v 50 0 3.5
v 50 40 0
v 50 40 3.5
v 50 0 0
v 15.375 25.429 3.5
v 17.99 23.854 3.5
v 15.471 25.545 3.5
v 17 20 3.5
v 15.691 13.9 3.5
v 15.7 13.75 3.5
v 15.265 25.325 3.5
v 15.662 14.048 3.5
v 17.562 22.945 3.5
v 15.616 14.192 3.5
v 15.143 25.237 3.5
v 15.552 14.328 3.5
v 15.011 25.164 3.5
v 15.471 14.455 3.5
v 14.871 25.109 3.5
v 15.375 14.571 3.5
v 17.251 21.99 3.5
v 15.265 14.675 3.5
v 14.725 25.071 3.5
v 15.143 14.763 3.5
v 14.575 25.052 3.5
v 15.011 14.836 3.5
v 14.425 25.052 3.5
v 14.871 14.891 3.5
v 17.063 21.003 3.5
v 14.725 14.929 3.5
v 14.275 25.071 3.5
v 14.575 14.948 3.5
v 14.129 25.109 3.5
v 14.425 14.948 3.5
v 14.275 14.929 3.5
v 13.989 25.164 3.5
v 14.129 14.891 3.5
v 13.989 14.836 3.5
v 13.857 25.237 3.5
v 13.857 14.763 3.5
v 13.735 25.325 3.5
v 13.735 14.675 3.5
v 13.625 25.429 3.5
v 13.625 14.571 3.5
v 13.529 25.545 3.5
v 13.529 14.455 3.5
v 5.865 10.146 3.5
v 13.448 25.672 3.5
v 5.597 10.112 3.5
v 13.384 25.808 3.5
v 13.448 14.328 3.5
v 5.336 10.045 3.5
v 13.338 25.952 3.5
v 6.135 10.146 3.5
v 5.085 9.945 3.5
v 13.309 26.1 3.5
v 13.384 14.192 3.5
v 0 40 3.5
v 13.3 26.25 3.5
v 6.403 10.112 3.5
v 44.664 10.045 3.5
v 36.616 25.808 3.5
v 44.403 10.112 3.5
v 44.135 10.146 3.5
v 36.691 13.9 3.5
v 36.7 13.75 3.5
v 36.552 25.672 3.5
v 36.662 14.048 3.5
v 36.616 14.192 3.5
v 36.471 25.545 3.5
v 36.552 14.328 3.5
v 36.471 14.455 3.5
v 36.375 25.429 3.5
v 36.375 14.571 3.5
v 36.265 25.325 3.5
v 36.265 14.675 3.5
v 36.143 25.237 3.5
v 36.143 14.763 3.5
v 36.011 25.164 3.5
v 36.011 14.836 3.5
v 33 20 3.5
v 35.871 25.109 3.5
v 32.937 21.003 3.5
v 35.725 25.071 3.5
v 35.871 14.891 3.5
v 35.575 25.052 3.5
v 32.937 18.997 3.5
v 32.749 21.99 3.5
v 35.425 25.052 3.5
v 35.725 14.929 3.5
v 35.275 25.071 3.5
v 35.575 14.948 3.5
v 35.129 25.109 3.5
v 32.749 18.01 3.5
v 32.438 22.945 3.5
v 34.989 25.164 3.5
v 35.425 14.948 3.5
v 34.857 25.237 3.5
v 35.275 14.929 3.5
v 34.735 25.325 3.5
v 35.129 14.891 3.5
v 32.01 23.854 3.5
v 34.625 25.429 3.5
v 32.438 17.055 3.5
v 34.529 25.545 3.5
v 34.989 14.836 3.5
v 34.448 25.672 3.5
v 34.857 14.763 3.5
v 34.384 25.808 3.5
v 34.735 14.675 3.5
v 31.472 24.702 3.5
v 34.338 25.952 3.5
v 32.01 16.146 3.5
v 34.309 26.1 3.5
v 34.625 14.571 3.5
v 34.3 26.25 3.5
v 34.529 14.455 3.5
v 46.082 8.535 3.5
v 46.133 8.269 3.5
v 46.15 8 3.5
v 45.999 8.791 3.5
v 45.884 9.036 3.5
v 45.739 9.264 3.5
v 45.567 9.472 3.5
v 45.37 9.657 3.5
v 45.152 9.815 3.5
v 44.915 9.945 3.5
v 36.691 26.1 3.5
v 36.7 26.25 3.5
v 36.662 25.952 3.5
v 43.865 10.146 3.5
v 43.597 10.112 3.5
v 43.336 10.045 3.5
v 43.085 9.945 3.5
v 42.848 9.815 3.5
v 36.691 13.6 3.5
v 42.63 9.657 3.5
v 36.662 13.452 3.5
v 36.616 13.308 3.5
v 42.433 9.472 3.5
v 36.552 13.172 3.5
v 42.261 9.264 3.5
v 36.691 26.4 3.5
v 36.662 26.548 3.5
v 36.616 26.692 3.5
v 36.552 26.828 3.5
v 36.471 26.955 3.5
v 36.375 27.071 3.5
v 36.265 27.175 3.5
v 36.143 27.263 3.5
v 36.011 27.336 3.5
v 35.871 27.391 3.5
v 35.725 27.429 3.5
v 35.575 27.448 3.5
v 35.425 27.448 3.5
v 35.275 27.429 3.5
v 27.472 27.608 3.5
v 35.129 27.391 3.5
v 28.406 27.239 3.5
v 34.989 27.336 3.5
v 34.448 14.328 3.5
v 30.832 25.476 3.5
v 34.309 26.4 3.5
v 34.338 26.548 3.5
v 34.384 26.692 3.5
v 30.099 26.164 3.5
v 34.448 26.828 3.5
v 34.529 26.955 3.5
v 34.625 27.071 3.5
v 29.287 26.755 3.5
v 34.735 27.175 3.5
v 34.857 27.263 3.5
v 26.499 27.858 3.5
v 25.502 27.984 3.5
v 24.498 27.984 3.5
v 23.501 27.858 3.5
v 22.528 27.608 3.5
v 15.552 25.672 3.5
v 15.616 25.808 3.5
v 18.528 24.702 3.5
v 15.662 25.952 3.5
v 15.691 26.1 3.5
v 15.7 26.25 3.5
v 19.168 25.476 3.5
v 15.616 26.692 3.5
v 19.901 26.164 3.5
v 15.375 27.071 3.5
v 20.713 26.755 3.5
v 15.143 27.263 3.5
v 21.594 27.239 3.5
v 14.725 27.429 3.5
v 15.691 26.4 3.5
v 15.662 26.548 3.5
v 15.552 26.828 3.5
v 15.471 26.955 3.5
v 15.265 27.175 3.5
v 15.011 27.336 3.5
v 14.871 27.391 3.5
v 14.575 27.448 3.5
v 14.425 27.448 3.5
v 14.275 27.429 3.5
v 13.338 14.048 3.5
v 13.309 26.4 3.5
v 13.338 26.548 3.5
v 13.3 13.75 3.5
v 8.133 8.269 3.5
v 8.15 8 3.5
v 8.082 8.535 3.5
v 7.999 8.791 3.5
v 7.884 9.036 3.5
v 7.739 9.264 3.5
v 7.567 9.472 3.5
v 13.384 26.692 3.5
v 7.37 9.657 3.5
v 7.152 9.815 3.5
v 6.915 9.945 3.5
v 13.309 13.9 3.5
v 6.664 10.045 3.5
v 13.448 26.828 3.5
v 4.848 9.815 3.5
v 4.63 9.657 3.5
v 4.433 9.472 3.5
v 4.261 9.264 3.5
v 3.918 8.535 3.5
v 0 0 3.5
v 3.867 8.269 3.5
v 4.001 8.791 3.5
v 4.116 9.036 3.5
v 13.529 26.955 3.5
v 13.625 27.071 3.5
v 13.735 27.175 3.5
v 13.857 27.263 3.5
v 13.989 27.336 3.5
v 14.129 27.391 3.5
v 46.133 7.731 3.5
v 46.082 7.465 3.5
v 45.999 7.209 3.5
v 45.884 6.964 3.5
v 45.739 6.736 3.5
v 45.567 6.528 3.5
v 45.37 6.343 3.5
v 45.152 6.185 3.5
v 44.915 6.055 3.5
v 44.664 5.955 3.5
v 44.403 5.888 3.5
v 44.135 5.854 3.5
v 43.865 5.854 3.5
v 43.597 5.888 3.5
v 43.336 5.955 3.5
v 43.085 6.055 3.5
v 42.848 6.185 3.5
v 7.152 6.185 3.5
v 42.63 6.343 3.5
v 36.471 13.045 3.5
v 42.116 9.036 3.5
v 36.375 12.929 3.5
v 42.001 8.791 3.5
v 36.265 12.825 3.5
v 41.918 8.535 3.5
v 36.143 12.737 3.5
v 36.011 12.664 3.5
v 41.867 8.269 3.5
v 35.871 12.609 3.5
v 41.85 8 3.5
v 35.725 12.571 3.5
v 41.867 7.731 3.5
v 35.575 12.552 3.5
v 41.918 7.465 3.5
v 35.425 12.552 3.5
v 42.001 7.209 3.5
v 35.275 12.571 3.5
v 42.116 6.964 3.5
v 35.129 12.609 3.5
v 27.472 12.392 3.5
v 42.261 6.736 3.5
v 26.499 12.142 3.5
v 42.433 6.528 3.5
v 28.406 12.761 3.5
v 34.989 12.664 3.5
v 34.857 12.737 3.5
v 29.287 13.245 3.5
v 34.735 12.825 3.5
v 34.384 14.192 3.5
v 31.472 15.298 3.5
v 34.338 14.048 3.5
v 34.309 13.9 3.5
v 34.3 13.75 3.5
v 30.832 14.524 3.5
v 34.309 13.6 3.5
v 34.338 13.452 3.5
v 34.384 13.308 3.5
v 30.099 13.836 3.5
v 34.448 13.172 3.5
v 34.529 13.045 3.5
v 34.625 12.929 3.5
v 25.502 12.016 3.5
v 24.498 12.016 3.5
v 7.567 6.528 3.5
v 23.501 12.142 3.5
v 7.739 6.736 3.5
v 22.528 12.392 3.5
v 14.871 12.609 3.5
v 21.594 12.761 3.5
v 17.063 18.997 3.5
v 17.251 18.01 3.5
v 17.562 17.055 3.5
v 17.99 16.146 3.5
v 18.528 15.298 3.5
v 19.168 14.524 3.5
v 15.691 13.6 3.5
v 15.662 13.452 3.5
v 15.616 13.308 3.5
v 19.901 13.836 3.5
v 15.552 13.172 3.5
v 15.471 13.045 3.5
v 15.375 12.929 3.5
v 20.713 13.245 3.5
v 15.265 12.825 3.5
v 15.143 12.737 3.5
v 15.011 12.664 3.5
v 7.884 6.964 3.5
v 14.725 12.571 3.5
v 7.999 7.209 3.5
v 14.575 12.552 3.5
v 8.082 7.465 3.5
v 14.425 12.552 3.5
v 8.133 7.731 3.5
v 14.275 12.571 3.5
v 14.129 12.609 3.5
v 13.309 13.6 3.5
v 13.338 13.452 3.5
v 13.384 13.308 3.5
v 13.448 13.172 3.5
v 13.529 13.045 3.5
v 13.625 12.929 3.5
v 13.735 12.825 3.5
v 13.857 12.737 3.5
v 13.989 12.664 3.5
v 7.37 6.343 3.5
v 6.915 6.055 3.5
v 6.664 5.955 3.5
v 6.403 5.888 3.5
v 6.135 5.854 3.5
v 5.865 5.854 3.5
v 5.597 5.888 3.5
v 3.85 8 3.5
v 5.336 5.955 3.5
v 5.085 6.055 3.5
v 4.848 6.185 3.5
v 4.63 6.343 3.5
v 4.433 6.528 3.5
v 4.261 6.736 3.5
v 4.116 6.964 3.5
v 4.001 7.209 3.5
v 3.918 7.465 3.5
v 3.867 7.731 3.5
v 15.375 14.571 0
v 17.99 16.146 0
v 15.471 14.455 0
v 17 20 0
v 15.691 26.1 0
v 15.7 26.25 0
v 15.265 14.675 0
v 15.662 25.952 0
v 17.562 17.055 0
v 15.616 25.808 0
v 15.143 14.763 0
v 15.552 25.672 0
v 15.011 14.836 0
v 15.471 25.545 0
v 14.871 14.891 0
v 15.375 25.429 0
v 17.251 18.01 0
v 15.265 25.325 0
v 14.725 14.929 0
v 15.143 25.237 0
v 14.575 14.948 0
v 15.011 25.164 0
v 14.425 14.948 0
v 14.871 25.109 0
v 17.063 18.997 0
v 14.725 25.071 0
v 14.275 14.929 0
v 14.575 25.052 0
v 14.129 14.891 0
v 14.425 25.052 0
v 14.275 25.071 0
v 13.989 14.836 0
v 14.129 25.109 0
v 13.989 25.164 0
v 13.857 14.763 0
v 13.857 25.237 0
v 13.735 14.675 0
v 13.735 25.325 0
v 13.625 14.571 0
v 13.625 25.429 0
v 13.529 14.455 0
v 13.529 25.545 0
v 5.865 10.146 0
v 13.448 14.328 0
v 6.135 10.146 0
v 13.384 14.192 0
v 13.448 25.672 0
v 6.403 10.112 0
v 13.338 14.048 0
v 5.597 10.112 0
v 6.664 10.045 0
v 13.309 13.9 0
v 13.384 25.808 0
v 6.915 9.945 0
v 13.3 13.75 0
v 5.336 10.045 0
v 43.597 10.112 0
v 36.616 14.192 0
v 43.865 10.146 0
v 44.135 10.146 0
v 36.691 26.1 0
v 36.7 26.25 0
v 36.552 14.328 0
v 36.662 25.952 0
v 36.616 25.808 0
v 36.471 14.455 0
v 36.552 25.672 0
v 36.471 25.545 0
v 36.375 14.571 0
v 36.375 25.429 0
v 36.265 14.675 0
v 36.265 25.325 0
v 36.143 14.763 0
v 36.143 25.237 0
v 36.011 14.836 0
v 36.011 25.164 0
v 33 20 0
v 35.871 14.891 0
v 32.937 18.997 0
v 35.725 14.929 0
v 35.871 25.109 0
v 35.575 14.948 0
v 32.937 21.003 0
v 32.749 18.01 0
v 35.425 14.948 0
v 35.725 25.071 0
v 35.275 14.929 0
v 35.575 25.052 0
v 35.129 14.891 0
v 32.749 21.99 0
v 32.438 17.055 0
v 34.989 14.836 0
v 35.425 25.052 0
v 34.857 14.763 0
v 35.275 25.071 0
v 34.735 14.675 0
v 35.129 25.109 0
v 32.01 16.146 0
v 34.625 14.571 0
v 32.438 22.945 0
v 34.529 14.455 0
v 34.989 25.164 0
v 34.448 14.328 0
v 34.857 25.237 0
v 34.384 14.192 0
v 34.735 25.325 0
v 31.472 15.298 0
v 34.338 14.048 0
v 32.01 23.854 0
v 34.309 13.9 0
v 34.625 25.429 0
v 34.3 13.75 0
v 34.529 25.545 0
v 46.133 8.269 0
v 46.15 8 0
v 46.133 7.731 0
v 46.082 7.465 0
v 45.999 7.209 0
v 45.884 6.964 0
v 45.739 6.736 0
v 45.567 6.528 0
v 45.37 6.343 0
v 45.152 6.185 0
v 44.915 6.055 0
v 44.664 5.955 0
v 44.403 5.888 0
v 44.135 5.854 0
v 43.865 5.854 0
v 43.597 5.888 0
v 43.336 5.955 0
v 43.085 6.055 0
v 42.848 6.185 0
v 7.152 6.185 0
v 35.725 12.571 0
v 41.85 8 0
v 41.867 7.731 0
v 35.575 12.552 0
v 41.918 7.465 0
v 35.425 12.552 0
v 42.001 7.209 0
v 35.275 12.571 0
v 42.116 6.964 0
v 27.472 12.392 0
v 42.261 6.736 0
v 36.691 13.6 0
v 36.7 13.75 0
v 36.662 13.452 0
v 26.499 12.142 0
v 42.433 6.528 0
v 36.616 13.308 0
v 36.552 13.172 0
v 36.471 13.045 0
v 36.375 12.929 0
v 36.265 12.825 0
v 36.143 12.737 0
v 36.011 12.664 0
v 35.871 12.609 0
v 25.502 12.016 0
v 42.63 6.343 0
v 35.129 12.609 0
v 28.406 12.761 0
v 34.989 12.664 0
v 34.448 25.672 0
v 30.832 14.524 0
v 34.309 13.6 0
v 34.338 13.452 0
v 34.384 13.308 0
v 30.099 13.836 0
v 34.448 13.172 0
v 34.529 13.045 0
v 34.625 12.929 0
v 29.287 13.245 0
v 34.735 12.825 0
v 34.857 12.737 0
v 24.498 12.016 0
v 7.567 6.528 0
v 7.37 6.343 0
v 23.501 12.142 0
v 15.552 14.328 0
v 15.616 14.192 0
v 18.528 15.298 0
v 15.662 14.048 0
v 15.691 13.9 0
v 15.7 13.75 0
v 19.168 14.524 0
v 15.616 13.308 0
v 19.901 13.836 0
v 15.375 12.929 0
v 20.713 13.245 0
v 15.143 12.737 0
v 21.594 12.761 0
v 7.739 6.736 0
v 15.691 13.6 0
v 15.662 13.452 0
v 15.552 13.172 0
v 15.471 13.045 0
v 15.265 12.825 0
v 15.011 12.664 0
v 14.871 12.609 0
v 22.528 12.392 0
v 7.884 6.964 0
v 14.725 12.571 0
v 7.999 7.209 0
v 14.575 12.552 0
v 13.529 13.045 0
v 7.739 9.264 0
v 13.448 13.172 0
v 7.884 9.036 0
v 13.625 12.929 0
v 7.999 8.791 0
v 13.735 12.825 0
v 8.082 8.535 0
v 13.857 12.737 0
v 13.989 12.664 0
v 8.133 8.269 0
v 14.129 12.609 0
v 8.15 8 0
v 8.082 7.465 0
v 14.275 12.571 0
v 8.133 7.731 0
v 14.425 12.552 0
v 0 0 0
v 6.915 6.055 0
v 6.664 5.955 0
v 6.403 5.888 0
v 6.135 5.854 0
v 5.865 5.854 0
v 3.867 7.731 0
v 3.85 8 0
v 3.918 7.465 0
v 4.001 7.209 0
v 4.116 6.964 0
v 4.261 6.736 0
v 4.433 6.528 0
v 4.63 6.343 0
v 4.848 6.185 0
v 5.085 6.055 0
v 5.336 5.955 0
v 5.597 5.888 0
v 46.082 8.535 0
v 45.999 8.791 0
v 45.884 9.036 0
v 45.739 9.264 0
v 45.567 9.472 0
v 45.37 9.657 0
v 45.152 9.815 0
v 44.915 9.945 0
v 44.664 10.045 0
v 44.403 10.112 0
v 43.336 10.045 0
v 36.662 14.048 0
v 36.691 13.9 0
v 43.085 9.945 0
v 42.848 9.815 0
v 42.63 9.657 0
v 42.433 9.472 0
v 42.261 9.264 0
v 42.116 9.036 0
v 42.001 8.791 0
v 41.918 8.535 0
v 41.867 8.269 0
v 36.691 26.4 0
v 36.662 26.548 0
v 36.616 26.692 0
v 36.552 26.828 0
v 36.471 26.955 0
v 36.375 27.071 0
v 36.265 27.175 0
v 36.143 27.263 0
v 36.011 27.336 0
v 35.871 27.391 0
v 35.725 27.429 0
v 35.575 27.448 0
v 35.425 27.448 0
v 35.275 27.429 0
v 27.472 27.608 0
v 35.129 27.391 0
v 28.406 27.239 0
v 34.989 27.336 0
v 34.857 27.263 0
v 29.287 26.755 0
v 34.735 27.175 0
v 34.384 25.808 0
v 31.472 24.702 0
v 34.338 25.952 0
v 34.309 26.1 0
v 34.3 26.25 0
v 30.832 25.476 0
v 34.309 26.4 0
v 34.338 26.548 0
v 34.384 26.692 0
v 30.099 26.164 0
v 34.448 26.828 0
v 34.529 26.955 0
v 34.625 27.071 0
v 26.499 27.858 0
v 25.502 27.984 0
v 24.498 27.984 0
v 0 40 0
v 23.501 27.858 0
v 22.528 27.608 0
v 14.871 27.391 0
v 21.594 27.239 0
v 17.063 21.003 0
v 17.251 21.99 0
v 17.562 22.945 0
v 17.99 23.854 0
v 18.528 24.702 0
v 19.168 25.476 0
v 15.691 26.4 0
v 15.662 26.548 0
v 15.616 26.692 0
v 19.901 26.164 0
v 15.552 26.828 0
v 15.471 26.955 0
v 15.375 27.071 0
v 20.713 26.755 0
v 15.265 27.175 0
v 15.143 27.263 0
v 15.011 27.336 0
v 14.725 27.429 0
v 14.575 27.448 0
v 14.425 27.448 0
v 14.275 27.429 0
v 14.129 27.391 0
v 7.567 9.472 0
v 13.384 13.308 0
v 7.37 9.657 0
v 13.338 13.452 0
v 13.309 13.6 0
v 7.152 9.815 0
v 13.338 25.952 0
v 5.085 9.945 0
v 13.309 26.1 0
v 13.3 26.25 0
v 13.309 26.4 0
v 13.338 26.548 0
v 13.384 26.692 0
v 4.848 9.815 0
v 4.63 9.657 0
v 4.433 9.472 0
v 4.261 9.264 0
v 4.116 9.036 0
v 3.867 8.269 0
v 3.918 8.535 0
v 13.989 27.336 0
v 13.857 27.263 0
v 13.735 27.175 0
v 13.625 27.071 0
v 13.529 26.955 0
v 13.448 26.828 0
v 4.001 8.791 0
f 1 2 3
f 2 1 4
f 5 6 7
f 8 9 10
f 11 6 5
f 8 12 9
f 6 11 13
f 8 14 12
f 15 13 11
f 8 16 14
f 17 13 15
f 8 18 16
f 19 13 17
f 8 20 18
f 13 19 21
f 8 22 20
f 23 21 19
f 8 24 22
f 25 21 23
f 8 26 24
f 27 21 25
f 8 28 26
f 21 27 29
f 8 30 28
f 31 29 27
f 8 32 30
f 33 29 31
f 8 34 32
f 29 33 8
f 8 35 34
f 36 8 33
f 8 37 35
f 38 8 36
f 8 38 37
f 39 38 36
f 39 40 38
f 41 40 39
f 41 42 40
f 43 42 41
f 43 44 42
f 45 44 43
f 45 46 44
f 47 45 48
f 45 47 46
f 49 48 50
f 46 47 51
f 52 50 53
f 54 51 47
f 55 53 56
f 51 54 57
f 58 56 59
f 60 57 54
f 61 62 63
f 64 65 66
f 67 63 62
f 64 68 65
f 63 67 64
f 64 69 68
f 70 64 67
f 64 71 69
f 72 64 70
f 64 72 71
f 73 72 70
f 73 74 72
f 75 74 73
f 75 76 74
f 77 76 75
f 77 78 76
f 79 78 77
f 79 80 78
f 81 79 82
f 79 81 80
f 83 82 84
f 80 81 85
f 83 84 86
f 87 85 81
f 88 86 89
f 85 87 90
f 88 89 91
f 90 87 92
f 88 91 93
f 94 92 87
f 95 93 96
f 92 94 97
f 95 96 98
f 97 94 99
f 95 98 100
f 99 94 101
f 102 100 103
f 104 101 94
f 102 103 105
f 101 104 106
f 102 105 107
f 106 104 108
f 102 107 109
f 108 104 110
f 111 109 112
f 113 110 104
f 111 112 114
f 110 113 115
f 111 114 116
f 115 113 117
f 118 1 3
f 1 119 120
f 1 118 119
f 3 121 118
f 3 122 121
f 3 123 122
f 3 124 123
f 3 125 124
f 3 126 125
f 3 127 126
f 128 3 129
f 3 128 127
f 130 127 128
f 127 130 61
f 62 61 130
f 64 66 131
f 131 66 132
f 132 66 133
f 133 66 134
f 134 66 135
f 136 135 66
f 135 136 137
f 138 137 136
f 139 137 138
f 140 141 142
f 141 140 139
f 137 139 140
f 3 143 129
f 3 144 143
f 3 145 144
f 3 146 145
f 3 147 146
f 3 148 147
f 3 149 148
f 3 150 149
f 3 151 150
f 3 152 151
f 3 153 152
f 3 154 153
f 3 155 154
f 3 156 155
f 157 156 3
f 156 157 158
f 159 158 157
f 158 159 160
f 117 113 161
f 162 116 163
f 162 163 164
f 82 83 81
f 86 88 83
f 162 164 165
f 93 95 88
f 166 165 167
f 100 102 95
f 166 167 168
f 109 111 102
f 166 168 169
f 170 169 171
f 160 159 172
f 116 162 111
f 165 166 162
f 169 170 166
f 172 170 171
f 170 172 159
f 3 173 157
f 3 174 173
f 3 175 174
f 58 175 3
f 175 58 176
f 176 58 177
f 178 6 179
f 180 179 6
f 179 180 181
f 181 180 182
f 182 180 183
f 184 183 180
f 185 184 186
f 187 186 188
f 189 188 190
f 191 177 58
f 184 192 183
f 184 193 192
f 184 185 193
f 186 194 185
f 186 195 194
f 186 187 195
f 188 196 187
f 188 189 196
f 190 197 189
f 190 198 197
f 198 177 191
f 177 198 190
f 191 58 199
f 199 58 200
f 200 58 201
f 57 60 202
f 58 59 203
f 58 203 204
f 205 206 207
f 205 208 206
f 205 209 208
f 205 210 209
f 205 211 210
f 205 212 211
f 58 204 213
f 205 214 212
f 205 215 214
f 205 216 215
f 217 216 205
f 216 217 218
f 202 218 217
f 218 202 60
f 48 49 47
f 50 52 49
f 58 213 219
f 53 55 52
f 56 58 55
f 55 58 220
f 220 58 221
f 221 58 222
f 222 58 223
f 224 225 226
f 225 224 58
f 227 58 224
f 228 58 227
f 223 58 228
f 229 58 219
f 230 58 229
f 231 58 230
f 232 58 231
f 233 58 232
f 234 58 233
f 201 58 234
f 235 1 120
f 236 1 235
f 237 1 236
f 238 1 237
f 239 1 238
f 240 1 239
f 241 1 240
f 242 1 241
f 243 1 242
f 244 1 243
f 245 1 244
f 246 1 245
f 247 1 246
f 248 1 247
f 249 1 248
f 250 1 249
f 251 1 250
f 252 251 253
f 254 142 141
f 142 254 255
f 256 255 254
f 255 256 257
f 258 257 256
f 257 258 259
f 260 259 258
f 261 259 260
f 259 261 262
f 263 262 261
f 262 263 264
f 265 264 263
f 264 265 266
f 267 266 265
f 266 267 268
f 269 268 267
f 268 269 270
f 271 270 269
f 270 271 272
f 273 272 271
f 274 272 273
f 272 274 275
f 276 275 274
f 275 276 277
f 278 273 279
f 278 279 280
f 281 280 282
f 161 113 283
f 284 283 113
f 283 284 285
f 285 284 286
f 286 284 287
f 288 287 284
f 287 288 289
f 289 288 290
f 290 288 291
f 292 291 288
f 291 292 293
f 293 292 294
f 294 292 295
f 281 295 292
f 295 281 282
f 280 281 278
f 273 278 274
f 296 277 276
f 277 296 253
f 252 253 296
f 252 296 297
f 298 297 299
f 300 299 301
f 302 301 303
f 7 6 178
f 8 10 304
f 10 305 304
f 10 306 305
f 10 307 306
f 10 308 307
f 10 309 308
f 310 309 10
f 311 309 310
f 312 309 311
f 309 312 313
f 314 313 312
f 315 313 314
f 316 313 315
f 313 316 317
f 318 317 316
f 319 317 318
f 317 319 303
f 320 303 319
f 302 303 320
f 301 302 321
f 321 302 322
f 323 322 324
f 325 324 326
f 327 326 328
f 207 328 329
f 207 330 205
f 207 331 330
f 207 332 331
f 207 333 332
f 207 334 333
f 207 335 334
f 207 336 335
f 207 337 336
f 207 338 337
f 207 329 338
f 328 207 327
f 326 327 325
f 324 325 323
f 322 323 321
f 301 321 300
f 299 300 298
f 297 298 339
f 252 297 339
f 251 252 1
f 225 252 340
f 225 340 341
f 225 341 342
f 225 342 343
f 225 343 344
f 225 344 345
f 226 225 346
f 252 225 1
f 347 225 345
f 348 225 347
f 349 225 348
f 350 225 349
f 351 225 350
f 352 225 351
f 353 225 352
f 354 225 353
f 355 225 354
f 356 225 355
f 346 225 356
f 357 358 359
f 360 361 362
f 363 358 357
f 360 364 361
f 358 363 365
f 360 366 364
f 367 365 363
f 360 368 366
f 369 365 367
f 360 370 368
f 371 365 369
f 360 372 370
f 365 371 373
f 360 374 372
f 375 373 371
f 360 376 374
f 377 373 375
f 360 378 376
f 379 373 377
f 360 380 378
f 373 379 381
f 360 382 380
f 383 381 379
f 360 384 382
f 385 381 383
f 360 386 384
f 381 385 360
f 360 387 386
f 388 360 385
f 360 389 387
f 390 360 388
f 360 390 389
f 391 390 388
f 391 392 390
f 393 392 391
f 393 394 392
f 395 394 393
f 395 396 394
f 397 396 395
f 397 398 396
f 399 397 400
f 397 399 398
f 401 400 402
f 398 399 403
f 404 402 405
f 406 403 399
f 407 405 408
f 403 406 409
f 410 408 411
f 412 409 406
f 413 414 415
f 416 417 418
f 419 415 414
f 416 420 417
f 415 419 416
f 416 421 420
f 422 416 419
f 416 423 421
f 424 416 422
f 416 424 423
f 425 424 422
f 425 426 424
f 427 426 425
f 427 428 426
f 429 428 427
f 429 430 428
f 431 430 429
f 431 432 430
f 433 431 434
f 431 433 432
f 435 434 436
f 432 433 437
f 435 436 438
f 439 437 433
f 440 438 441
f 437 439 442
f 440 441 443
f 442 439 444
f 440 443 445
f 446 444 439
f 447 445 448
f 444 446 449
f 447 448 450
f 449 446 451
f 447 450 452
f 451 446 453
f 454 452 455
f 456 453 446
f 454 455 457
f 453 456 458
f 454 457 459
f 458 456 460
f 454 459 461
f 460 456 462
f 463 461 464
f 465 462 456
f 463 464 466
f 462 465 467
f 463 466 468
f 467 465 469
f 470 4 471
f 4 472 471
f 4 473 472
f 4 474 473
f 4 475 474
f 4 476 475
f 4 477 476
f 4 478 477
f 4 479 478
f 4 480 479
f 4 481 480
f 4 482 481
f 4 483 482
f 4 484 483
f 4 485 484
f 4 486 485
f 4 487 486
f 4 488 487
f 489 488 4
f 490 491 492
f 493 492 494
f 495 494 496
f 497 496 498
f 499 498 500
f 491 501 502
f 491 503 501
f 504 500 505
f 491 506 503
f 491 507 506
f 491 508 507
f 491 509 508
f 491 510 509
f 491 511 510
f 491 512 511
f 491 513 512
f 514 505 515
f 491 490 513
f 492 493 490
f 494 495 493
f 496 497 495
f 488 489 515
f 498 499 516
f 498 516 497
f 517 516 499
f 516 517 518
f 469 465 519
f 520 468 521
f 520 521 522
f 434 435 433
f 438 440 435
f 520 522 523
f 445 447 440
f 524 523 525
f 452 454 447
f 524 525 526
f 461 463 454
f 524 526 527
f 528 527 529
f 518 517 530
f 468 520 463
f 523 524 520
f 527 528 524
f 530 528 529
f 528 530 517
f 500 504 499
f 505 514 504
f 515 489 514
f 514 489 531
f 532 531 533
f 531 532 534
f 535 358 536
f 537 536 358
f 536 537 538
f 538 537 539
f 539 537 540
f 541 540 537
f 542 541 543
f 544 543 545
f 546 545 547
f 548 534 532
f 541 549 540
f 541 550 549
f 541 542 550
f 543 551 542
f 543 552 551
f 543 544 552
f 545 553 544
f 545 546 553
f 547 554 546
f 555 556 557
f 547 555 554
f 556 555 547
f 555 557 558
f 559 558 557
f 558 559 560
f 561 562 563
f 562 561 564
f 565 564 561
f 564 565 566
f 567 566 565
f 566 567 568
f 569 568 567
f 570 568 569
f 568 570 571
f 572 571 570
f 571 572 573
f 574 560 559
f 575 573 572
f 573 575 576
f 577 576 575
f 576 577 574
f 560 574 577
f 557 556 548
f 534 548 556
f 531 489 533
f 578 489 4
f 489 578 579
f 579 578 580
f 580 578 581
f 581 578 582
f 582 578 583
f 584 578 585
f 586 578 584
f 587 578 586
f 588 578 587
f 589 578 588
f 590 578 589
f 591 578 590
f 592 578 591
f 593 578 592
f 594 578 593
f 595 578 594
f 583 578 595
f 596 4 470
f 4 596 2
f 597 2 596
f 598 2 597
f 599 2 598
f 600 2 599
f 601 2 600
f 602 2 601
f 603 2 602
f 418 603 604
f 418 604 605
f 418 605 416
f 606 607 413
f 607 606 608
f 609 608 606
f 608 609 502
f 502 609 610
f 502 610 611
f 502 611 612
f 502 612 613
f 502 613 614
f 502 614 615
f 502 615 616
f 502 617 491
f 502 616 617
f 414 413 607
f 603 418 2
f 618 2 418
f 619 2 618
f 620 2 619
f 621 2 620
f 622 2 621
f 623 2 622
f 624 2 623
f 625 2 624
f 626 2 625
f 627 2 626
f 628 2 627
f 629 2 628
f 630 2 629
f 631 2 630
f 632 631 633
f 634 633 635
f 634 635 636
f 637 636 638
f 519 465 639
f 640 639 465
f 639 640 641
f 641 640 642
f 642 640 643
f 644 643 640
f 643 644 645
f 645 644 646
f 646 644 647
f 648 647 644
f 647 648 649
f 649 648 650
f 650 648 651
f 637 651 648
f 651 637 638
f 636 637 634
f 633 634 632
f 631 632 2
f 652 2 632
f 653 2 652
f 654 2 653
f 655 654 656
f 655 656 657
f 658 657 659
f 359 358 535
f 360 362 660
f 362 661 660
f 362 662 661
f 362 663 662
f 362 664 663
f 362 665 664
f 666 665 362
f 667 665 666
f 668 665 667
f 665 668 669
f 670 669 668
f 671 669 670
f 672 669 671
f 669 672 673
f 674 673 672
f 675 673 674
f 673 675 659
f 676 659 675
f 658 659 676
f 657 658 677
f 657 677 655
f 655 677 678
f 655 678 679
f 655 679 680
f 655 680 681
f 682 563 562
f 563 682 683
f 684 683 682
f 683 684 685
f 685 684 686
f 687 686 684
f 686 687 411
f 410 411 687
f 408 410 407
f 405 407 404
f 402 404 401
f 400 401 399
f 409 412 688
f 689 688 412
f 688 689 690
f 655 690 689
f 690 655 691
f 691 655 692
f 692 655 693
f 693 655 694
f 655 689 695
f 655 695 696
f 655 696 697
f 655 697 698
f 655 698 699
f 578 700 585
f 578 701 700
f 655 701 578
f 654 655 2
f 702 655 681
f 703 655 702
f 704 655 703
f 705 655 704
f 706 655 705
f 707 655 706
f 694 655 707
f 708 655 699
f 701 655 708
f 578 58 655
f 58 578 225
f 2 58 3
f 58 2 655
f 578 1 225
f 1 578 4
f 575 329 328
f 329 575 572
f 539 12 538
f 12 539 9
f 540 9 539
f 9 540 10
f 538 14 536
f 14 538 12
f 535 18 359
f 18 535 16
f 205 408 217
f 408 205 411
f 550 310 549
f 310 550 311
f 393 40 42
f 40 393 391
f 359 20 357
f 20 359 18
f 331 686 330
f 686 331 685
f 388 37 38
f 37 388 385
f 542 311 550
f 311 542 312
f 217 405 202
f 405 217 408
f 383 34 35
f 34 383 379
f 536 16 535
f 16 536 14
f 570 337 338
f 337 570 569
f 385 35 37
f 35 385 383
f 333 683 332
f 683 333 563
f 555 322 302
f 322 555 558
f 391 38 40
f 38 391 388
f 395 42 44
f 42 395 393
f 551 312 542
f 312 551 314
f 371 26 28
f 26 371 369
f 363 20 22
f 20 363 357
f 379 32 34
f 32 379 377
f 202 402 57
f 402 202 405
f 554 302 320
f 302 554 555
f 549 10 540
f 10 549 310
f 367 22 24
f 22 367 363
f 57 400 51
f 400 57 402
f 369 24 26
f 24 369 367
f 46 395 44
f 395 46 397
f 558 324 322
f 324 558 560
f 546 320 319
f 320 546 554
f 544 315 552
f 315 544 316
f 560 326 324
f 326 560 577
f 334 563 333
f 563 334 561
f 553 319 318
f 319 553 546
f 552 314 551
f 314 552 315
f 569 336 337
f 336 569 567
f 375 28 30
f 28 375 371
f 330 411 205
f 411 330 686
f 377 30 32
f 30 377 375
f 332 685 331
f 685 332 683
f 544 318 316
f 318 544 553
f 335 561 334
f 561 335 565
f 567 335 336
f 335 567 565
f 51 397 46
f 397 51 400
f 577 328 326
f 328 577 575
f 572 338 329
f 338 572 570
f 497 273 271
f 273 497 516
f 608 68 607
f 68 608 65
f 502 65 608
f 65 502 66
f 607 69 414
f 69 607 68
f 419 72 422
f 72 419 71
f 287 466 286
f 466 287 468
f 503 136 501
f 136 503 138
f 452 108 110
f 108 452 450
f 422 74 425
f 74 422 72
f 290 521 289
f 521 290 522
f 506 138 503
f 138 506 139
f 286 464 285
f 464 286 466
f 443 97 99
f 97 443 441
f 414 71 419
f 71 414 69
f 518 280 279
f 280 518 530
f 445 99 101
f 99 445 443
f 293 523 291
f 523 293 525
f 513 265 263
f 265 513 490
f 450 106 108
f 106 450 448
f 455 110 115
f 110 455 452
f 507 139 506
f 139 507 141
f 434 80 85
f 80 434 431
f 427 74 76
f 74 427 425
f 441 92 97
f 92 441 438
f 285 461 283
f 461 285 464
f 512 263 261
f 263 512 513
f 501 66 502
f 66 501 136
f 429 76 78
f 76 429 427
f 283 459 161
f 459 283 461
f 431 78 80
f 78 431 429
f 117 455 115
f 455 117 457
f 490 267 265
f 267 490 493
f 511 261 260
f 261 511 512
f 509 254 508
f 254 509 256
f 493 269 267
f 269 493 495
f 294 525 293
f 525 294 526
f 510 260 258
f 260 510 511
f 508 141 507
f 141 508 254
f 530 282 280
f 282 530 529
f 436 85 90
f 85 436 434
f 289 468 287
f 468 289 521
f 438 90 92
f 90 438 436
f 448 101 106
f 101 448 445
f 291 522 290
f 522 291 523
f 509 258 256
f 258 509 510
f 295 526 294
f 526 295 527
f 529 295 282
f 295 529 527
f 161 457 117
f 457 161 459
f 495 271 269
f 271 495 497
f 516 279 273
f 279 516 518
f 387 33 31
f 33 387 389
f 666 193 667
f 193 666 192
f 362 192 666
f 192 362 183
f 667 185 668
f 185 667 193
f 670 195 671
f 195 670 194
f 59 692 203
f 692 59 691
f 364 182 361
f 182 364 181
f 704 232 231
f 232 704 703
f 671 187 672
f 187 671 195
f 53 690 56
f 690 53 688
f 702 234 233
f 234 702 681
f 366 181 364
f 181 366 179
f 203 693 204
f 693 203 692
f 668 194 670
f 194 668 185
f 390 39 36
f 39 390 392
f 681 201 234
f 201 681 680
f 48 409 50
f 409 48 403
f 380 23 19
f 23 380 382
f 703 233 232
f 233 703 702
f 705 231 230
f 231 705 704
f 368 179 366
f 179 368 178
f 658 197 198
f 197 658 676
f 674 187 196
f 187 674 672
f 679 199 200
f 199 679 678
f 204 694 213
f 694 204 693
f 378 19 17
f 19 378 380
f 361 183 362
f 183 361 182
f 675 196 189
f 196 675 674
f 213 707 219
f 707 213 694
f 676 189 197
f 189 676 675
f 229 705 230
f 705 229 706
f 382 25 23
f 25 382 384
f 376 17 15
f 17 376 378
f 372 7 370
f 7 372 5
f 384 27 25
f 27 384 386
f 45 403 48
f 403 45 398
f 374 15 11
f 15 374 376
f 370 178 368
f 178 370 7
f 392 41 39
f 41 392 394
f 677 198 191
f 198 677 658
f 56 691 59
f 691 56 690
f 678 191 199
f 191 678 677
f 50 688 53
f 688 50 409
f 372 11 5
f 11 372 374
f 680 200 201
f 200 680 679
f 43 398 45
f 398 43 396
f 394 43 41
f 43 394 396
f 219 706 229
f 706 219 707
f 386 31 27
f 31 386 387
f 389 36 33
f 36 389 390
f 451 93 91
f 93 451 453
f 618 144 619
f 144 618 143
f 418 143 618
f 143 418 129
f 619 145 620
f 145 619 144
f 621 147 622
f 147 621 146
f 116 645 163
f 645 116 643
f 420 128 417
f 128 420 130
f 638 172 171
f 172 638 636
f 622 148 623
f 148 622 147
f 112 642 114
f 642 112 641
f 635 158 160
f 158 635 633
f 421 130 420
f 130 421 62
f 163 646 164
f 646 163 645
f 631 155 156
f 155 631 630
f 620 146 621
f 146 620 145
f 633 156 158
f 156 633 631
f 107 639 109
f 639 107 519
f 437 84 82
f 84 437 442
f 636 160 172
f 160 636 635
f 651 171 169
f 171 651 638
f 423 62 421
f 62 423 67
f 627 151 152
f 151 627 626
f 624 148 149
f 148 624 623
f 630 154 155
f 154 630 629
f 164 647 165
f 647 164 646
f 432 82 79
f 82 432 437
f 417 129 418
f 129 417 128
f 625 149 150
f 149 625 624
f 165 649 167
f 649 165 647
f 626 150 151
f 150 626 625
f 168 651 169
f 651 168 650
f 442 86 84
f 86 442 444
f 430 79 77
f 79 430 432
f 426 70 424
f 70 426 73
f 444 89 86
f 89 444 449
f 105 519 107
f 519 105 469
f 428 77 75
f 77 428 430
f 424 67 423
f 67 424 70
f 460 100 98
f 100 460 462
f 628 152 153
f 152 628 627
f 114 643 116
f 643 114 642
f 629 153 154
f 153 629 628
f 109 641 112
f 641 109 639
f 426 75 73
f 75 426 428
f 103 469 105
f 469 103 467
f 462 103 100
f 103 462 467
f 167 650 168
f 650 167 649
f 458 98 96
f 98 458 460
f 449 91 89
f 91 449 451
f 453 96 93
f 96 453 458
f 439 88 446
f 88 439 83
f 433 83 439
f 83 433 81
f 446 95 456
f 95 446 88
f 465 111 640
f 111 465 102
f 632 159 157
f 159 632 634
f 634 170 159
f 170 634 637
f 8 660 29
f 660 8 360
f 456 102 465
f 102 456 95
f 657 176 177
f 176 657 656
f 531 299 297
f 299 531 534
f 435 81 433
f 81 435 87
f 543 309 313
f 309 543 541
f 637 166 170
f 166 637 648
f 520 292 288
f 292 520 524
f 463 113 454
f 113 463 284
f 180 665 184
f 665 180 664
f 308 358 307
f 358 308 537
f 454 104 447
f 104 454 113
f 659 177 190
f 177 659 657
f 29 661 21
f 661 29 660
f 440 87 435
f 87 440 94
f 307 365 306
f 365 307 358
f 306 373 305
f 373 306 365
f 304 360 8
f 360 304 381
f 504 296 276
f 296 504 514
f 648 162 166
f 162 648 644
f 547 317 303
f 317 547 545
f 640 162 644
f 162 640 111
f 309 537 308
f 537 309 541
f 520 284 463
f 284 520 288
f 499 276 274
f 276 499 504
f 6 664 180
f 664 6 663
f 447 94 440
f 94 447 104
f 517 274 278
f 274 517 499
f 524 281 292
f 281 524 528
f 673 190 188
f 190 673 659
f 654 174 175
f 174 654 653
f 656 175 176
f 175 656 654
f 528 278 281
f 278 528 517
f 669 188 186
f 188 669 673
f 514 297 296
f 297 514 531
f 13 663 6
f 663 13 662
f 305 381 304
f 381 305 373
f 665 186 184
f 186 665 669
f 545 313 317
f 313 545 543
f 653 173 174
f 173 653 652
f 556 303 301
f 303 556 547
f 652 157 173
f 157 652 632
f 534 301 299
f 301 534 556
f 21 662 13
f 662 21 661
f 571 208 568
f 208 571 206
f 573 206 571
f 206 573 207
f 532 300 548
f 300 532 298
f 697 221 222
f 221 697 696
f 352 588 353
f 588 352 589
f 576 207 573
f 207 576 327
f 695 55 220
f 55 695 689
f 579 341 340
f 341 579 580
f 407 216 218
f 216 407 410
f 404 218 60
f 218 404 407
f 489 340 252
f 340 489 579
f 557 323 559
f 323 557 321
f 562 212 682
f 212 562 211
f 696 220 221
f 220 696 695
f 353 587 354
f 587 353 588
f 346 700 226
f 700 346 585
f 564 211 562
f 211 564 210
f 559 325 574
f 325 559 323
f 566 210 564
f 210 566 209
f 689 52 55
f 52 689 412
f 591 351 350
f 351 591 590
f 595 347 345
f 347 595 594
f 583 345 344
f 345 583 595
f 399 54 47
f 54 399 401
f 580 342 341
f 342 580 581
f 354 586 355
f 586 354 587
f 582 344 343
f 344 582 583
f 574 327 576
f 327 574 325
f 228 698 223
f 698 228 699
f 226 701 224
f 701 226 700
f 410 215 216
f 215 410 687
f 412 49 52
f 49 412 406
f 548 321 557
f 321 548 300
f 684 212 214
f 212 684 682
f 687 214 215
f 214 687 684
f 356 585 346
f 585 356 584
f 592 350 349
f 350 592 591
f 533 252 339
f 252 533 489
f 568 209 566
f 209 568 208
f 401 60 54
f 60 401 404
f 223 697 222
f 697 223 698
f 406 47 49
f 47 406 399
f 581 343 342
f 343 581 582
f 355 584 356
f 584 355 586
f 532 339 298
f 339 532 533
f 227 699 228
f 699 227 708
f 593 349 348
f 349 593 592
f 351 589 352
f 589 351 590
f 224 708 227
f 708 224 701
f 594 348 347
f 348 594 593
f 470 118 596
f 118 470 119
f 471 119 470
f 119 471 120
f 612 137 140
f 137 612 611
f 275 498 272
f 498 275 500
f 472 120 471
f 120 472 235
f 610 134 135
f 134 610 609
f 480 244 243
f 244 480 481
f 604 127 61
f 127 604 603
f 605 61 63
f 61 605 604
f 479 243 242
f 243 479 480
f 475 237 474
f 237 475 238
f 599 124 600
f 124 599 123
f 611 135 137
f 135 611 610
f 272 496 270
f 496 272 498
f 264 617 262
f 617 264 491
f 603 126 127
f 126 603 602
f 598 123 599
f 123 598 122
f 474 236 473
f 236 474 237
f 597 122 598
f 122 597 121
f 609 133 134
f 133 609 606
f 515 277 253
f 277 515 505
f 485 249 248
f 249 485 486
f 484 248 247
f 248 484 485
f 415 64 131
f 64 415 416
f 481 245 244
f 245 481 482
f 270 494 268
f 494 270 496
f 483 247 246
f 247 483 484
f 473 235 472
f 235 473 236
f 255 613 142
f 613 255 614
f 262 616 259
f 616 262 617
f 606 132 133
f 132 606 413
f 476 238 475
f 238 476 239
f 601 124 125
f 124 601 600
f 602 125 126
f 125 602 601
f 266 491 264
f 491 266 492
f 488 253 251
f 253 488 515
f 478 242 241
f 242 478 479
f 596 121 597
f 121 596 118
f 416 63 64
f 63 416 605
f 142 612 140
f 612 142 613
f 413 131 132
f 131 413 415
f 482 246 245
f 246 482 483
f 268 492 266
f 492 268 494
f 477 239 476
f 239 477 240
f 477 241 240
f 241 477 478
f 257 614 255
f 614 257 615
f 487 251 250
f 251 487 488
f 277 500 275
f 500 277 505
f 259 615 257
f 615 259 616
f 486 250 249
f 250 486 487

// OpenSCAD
// Sıfır Atık YZ - Ayarlanabilir Kamera ve IR Sensör Taşıyıcı Braketi
// Konveyör bandın üzerine tepeden bakacak şekilde 2020 sigma profile monte edilir.
// WebCam veya PiCamera V2 / V3 ile uyumludur.

$fn = 50;

mount_width = 50;
mount_height = 40;
thickness = 3.5;

module camera_mount() {
    difference() {
        // Ana gövde
        cube([mount_width, mount_height, thickness]);

        // PiCamera Standart Montaj Delikleri (21mm x 12.5mm aralık, M2 cıvata)
        translate([mount_width/2 - 10.5, mount_height/2 - 6.25, -1])
            cylinder(h = thickness + 2, d = 2.4);
        translate([mount_width/2 + 10.5, mount_height/2 - 6.25, -1])
            cylinder(h = thickness + 2, d = 2.4);
        translate([mount_width/2 - 10.5, mount_height/2 + 6.25, -1])
            cylinder(h = thickness + 2, d = 2.4);
        translate([mount_width/2 + 10.5, mount_height/2 + 6.25, -1])
            cylinder(h = thickness + 2, d = 2.4);

        // Kamera lensi geçiş penceresi
        translate([mount_width/2, mount_height/2, -1])
            cylinder(h = thickness + 2, d = 16);

        // Yan profil montaj kanalları (M4 T-Nut için slotlar)
        translate([6, 8, -1])
            cylinder(h = thickness + 2, d = 4.3);
        translate([mount_width - 6, 8, -1])
            cylinder(h = thickness + 2, d = 4.3);
    }
}

camera_mount();
